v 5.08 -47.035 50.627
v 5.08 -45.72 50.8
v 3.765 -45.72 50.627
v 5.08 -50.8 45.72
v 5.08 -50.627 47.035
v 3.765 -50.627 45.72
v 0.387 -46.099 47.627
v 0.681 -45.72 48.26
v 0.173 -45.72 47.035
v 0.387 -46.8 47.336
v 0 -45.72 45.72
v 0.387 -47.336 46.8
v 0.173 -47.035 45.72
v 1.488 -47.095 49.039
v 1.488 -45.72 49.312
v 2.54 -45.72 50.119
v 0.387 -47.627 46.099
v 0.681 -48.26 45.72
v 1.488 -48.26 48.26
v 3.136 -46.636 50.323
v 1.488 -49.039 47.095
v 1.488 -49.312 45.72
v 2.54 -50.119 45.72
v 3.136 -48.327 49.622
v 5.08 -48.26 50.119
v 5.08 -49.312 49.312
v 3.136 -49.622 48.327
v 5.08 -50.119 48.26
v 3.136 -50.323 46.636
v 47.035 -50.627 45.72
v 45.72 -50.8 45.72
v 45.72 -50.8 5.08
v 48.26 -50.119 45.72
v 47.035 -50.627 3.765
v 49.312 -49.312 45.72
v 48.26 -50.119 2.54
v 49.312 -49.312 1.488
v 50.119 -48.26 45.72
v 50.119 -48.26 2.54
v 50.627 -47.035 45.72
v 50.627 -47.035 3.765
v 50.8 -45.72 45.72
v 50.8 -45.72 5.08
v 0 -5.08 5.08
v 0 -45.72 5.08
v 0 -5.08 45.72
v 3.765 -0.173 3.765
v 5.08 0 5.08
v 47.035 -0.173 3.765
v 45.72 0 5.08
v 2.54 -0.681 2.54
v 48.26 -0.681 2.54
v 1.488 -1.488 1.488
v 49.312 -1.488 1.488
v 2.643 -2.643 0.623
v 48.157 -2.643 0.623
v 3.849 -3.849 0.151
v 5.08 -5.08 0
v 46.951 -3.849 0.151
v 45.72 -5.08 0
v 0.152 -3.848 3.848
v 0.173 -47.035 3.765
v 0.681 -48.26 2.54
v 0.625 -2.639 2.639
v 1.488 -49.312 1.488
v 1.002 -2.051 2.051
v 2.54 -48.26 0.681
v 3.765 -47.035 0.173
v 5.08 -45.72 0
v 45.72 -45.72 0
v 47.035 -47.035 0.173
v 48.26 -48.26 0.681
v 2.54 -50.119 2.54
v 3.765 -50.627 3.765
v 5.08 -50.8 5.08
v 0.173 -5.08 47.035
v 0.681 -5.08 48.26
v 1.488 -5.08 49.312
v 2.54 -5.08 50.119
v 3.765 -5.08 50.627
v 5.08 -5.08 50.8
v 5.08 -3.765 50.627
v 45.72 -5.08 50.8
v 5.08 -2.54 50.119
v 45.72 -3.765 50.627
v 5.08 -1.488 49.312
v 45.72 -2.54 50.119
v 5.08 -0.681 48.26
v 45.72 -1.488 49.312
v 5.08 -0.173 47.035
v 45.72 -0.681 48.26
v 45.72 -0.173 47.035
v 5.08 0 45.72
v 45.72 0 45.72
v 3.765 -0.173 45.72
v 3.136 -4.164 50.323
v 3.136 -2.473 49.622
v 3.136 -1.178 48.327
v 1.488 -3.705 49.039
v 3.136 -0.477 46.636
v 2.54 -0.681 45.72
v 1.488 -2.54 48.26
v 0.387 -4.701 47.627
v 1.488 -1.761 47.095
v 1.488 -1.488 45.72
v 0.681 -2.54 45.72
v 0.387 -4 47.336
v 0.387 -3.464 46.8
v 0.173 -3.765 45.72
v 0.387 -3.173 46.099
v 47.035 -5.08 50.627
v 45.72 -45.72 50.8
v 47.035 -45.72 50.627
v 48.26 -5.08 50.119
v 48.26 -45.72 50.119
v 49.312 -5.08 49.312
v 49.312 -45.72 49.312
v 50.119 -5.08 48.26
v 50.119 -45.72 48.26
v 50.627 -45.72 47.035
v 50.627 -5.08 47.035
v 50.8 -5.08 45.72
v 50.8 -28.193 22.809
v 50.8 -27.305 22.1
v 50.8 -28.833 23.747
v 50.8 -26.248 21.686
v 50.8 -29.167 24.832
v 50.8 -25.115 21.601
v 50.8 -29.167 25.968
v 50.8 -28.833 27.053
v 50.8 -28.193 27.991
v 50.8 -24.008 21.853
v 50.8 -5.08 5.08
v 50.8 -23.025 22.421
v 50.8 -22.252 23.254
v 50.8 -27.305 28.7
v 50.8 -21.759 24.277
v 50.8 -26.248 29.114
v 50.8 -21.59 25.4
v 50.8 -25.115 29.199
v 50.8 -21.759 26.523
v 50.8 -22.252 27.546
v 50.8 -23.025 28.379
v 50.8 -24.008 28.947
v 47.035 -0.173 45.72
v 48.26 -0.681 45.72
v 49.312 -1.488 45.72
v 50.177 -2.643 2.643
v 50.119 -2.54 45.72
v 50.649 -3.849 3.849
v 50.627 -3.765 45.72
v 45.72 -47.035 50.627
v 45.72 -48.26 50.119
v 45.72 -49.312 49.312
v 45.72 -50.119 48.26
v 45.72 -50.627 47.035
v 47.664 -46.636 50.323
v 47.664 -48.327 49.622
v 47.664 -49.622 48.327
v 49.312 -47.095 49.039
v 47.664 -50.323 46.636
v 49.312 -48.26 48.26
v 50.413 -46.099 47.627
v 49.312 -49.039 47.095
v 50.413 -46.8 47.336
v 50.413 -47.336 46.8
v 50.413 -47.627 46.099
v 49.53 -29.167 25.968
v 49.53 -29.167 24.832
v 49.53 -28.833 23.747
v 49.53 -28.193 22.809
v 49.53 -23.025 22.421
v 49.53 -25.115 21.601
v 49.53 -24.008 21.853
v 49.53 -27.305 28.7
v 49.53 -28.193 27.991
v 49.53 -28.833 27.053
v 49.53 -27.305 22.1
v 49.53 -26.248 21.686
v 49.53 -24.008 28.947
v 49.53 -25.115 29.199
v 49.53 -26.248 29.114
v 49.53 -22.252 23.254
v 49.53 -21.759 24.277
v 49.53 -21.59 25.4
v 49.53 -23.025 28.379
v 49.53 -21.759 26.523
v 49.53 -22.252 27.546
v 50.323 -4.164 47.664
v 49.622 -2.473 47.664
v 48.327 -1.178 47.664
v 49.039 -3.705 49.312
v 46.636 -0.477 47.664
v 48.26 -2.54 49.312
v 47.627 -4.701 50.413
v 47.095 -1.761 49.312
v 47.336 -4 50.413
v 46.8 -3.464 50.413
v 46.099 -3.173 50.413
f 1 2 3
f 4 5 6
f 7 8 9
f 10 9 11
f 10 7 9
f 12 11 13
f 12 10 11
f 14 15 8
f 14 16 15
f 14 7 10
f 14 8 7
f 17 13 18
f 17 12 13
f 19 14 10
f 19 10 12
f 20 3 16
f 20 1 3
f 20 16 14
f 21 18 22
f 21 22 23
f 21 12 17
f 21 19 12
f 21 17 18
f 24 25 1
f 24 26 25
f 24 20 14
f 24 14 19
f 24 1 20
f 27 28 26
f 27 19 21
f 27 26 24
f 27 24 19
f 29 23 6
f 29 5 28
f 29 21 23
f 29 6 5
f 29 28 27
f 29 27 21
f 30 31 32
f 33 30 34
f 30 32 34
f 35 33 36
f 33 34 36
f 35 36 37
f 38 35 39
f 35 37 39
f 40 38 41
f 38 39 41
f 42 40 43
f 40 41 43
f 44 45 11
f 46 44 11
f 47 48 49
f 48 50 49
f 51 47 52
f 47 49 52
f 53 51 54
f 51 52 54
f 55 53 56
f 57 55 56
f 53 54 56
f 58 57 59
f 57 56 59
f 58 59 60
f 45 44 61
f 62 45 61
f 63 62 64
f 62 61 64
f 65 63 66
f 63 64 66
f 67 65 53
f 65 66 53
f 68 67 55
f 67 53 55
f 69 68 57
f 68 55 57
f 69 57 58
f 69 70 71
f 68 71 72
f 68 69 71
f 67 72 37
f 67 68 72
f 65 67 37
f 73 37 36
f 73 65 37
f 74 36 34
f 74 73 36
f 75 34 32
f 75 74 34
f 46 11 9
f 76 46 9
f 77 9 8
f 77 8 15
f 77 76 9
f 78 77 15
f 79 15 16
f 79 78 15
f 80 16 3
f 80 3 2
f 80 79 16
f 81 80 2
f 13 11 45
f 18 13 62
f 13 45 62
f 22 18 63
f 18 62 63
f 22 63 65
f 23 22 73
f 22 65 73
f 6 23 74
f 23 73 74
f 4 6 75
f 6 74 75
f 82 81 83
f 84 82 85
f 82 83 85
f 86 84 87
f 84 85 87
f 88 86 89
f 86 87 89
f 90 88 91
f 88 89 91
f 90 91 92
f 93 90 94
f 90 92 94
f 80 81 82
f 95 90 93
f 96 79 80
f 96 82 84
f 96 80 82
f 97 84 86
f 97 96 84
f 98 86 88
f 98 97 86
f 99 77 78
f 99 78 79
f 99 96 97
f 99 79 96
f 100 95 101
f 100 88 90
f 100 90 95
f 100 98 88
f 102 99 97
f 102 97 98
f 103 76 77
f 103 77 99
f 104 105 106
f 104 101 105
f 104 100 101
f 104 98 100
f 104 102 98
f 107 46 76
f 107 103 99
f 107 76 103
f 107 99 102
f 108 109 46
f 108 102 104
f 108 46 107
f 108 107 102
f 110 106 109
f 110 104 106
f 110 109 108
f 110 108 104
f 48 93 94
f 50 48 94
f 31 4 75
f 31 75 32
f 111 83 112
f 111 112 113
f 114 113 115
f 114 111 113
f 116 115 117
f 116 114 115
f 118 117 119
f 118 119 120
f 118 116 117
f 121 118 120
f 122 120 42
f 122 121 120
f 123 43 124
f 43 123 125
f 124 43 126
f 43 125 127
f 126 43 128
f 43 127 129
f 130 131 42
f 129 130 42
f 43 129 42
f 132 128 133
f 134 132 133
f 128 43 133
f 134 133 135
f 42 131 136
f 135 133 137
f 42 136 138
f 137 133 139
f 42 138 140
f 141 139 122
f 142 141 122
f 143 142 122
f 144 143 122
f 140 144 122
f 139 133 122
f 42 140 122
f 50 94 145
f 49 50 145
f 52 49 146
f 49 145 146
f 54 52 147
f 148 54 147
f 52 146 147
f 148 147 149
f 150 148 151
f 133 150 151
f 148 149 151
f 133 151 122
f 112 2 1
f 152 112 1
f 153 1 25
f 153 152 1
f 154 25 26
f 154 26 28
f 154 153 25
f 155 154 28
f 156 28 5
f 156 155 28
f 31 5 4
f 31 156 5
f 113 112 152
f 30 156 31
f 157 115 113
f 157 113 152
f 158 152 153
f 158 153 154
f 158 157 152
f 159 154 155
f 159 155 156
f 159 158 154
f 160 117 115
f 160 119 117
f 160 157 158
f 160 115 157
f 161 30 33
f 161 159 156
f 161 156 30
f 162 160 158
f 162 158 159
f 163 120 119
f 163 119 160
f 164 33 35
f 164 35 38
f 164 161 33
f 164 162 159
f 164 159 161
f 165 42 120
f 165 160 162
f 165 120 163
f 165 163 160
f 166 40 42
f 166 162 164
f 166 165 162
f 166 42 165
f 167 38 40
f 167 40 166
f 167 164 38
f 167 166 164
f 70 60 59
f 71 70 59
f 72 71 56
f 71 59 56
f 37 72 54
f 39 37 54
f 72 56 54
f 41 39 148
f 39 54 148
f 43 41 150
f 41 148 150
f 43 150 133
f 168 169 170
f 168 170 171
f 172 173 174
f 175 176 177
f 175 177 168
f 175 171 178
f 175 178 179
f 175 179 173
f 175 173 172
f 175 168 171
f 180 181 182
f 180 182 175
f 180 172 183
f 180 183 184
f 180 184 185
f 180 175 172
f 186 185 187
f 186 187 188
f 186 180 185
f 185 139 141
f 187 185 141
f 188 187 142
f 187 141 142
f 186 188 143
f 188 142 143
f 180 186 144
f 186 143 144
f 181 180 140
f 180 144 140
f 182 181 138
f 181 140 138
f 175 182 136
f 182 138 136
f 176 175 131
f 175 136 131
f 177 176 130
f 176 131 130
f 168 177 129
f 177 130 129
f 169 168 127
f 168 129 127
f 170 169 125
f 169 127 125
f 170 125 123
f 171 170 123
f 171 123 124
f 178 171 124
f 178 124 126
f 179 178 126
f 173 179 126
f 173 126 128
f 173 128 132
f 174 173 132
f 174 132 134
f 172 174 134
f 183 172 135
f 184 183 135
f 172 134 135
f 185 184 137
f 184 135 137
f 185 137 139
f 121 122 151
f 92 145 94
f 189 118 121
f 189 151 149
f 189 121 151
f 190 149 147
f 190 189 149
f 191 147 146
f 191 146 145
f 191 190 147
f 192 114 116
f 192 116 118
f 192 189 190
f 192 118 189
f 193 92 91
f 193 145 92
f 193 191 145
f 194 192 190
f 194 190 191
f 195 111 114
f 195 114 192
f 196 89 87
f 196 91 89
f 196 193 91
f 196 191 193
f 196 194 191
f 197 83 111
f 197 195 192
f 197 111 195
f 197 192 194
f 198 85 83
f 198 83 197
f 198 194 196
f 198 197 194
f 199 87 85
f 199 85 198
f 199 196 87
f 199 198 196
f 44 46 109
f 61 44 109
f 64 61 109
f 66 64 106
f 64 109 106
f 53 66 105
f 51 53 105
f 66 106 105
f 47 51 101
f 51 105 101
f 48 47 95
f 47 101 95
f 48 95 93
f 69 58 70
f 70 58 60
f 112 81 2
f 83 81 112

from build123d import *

# Parameters (mm, degrees)
F0_W         = 50.8
F0_H         = 50.8
F1_DEPTH     = 50.8
F2_R         = 5.08
F3_R         = 5.08
F4_T1_DEPTH  = 58.42
F4_T3_DEPTH  = 76.2
F4_T5_DEPTH  = 40.64
F4_S9_W      = 5.08
F4_S9_H      = 5.08
F4_T10_DEPTH = 5.08
F4_S15_W     = 5.08
F4_S15_H     = 5.08
F4_T16_DEPTH = 5.08
F4_T20_ANGLE = 90
F4_T22_ANGLE = 90
F5_T1_DEPTH  = 66.04
F6_T1_DEPTH  = 66.04
F7_R         = 3.81
F8_DEPTH     = 1.27


# Not quite as in the source:
# - a fillet or chamfer that OpenCascade refuses, or shapes differently, is made with other operations: its cross-section is extruded or revolved along the edge and cut away or added


with BuildPart() as f1:
    # F0 (on Front) → F1 (new body)
    with BuildSketch(Plane.XZ):
        with Locations((25.4, 25.4)):
            Rectangle(F0_W, F0_H)
    extrude(amount=F1_DEPTH)

    # F2
    f2_edges = [f1.edges().sort_by_distance(p)[0] for p in [
        (25.4, -50.8, 50.8),
    ]]
    fillet(f2_edges, radius=F2_R)

    # F3
    f3_edges = [f1.edges().sort_by_distance(p)[0] for p in [
        (25.4, 0, 50.8),
        (0, 0, 25.4),
        (25.4, 0, 0),
        (50.8, 0, 25.4),
    ]]
    fillet(f3_edges, radius=F3_R)

    # F4: fillet of radius 5.08 on 4 edges, made by hand

    # F4_s2 → F4_t1 (cut)
    with BuildSketch(Plane.XY.offset(-12.7)):
        with BuildLine():
            ThreePointArc((0, -45.72), (1.4878975516, -49.3121024484), (5.08, -50.8))
            Line((5.08, -50.8), (0, -50.8))
            Line((0, -50.8), (0, -45.72))
        make_face()
        with BuildLine():
            ThreePointArc((45.72, -50.8), (49.3121024484, -49.3121024484), (50.8, -45.72))
            Line((50.8, -45.72), (50.8, -50.8))
            Line((50.8, -50.8), (45.72, -50.8))
        make_face()
    extrude(amount=F4_T1_DEPTH, mode=Mode.SUBTRACT)

    # F4_s4 → F4_t3 (cut)
    with BuildSketch(Plane.YZ.offset(-12.7)):
        with BuildLine():
            ThreePointArc((-45.72, 0), (-49.3121024484, 1.4878975516), (-50.8, 5.08))
            Line((-50.8, 5.08), (-50.8, 0))
            Line((-50.8, 0), (-45.72, 0))
        make_face()
    extrude(amount=F4_T3_DEPTH, mode=Mode.SUBTRACT)

    # F4_s6 → F4_t5 (cut)
    with BuildSketch(Plane.XZ.offset(5.08)):
        with BuildLine():
            ThreePointArc((45.72, 50.8), (49.3121024484, 49.3121024484), (50.8, 45.72))
            Line((50.8, 45.72), (50.8, 50.8))
            Line((50.8, 50.8), (45.72, 50.8))
        make_face()
        with BuildLine():
            ThreePointArc((0, 45.72), (1.4878975516, 49.3121024484), (5.08, 50.8))
            Line((5.08, 50.8), (0, 50.8))
            Line((0, 50.8), (0, 45.72))
        make_face()
    extrude(amount=F4_T5_DEPTH, mode=Mode.SUBTRACT)


with BuildPart() as f4_tool8:
    # F4_s9 → F4_t10 (new body)
    with BuildSketch(Plane.XY.offset(45.72)):
        with Locations((48.26, -2.54)):
            Rectangle(F4_S9_W, F4_S9_H)
    extrude(amount=F4_T10_DEPTH)

    # F4_s11 → F4_t12 (revolve, cut)
    with BuildSketch(Plane(origin=(45.72, -5.08, 45.72), x_dir=(-0.7071067812, -0.7071067812, 0), z_dir=(-0.7071067812, 0.7071067812, 0))):
        with BuildLine():
            ThreePointArc((0, -5.08), (5.08, 0), (0, 5.08))
            Line((0, 5.08), (0, -5.08))
        make_face()
    revolve(axis=Axis((45.72, -5.08, 45.72), (0, 0, 1)), mode=Mode.SUBTRACT)


with BuildPart() as f1_1:
    add(f1.part)

    # F4_t7: cut F4_tool8
    add(f4_tool8.part, mode=Mode.SUBTRACT)


with BuildPart() as f4_tool14:
    # F4_s15 → F4_t16 (new body)
    with BuildSketch(Plane.YZ.offset(5.08)):
        with Locations((-2.54, 48.26)):
            Rectangle(F4_S15_W, F4_S15_H)
    extrude(amount=-F4_T16_DEPTH)

    # F4_s17 → F4_t18 (revolve, cut)
    with BuildSketch(Plane(origin=(5.08, -5.08, 45.72), x_dir=(0, -0.7071067812, -0.7071067812), z_dir=(0, 0.7071067812, -0.7071067812))):
        with BuildLine():
            ThreePointArc((0, -5.08), (5.08, 0), (0, 5.08))
            Line((0, 5.08), (0, -5.08))
        make_face()
    revolve(axis=Axis((5.08, -5.08, 45.72), (-1, 0, 0)), mode=Mode.SUBTRACT)


with BuildPart() as f1_2:
    add(f1_1.part)

    # F4_t13: cut F4_tool14
    add(f4_tool14.part, mode=Mode.SUBTRACT)

    # F4_s19 → F4_t20 (revolve, cut)
    with BuildSketch(Plane.XZ.offset(45.72)):
        with BuildLine():
            ThreePointArc((45.72, 50.8), (49.3121024484, 49.3121024484), (50.8, 45.72))
            Line((50.8, 45.72), (50.8, 50.8))
            Line((50.8, 50.8), (45.72, 50.8))
        make_face()
    revolve(axis=Axis((50.8, -45.72, 45.72), (1, 0, 0)), revolution_arc=F4_T20_ANGLE, mode=Mode.SUBTRACT)

    # F4_s21 → F4_t22 (revolve, cut)
    with BuildSketch(Plane.XZ.offset(45.72)):
        with BuildLine():
            ThreePointArc((0, 45.72), (1.4878975516, 49.3121024484), (5.08, 50.8))
            Line((5.08, 50.8), (0, 50.8))
            Line((0, 50.8), (0, 45.72))
        make_face()
    revolve(axis=Axis((0, -45.72, 45.72), (1, 0, 0)), revolution_arc=F4_T22_ANGLE, mode=Mode.SUBTRACT)

    # F5: fillet of radius 5.08 on 4 edges, made by hand

    # F5_s2 → F5_t1 (cut)
    with BuildSketch(Plane.XZ.offset(-7.62)):
        with BuildLine():
            ThreePointArc((0, 5.08), (1.4878975516, 1.4878975516), (5.08, 0))
            Line((5.08, 0), (0, 0))
            Line((0, 0), (0, 5.08))
        make_face()
    extrude(amount=F5_T1_DEPTH, mode=Mode.SUBTRACT)

    # F6: fillet of radius 5.08 on 4 edges, made by hand

    # F6_s2 → F6_t1 (cut)
    with BuildSketch(Plane.XZ.offset(-7.62)):
        with BuildLine():
            ThreePointArc((45.72, 0), (49.3121024484, 1.4878975516), (50.8, 5.08))
            Line((50.8, 5.08), (50.8, 0))
            Line((50.8, 0), (45.72, 0))
        make_face()
    extrude(amount=F6_T1_DEPTH, mode=Mode.SUBTRACT)

    # F7 (on face) → F8 (cut)
    with BuildSketch(Plane.YZ.offset(50.8)):
        with Locations((-25.4, 25.4)):
            Circle(F7_R)
    extrude(amount=-F8_DEPTH, mode=Mode.SUBTRACT)


solid = f1_2.part
